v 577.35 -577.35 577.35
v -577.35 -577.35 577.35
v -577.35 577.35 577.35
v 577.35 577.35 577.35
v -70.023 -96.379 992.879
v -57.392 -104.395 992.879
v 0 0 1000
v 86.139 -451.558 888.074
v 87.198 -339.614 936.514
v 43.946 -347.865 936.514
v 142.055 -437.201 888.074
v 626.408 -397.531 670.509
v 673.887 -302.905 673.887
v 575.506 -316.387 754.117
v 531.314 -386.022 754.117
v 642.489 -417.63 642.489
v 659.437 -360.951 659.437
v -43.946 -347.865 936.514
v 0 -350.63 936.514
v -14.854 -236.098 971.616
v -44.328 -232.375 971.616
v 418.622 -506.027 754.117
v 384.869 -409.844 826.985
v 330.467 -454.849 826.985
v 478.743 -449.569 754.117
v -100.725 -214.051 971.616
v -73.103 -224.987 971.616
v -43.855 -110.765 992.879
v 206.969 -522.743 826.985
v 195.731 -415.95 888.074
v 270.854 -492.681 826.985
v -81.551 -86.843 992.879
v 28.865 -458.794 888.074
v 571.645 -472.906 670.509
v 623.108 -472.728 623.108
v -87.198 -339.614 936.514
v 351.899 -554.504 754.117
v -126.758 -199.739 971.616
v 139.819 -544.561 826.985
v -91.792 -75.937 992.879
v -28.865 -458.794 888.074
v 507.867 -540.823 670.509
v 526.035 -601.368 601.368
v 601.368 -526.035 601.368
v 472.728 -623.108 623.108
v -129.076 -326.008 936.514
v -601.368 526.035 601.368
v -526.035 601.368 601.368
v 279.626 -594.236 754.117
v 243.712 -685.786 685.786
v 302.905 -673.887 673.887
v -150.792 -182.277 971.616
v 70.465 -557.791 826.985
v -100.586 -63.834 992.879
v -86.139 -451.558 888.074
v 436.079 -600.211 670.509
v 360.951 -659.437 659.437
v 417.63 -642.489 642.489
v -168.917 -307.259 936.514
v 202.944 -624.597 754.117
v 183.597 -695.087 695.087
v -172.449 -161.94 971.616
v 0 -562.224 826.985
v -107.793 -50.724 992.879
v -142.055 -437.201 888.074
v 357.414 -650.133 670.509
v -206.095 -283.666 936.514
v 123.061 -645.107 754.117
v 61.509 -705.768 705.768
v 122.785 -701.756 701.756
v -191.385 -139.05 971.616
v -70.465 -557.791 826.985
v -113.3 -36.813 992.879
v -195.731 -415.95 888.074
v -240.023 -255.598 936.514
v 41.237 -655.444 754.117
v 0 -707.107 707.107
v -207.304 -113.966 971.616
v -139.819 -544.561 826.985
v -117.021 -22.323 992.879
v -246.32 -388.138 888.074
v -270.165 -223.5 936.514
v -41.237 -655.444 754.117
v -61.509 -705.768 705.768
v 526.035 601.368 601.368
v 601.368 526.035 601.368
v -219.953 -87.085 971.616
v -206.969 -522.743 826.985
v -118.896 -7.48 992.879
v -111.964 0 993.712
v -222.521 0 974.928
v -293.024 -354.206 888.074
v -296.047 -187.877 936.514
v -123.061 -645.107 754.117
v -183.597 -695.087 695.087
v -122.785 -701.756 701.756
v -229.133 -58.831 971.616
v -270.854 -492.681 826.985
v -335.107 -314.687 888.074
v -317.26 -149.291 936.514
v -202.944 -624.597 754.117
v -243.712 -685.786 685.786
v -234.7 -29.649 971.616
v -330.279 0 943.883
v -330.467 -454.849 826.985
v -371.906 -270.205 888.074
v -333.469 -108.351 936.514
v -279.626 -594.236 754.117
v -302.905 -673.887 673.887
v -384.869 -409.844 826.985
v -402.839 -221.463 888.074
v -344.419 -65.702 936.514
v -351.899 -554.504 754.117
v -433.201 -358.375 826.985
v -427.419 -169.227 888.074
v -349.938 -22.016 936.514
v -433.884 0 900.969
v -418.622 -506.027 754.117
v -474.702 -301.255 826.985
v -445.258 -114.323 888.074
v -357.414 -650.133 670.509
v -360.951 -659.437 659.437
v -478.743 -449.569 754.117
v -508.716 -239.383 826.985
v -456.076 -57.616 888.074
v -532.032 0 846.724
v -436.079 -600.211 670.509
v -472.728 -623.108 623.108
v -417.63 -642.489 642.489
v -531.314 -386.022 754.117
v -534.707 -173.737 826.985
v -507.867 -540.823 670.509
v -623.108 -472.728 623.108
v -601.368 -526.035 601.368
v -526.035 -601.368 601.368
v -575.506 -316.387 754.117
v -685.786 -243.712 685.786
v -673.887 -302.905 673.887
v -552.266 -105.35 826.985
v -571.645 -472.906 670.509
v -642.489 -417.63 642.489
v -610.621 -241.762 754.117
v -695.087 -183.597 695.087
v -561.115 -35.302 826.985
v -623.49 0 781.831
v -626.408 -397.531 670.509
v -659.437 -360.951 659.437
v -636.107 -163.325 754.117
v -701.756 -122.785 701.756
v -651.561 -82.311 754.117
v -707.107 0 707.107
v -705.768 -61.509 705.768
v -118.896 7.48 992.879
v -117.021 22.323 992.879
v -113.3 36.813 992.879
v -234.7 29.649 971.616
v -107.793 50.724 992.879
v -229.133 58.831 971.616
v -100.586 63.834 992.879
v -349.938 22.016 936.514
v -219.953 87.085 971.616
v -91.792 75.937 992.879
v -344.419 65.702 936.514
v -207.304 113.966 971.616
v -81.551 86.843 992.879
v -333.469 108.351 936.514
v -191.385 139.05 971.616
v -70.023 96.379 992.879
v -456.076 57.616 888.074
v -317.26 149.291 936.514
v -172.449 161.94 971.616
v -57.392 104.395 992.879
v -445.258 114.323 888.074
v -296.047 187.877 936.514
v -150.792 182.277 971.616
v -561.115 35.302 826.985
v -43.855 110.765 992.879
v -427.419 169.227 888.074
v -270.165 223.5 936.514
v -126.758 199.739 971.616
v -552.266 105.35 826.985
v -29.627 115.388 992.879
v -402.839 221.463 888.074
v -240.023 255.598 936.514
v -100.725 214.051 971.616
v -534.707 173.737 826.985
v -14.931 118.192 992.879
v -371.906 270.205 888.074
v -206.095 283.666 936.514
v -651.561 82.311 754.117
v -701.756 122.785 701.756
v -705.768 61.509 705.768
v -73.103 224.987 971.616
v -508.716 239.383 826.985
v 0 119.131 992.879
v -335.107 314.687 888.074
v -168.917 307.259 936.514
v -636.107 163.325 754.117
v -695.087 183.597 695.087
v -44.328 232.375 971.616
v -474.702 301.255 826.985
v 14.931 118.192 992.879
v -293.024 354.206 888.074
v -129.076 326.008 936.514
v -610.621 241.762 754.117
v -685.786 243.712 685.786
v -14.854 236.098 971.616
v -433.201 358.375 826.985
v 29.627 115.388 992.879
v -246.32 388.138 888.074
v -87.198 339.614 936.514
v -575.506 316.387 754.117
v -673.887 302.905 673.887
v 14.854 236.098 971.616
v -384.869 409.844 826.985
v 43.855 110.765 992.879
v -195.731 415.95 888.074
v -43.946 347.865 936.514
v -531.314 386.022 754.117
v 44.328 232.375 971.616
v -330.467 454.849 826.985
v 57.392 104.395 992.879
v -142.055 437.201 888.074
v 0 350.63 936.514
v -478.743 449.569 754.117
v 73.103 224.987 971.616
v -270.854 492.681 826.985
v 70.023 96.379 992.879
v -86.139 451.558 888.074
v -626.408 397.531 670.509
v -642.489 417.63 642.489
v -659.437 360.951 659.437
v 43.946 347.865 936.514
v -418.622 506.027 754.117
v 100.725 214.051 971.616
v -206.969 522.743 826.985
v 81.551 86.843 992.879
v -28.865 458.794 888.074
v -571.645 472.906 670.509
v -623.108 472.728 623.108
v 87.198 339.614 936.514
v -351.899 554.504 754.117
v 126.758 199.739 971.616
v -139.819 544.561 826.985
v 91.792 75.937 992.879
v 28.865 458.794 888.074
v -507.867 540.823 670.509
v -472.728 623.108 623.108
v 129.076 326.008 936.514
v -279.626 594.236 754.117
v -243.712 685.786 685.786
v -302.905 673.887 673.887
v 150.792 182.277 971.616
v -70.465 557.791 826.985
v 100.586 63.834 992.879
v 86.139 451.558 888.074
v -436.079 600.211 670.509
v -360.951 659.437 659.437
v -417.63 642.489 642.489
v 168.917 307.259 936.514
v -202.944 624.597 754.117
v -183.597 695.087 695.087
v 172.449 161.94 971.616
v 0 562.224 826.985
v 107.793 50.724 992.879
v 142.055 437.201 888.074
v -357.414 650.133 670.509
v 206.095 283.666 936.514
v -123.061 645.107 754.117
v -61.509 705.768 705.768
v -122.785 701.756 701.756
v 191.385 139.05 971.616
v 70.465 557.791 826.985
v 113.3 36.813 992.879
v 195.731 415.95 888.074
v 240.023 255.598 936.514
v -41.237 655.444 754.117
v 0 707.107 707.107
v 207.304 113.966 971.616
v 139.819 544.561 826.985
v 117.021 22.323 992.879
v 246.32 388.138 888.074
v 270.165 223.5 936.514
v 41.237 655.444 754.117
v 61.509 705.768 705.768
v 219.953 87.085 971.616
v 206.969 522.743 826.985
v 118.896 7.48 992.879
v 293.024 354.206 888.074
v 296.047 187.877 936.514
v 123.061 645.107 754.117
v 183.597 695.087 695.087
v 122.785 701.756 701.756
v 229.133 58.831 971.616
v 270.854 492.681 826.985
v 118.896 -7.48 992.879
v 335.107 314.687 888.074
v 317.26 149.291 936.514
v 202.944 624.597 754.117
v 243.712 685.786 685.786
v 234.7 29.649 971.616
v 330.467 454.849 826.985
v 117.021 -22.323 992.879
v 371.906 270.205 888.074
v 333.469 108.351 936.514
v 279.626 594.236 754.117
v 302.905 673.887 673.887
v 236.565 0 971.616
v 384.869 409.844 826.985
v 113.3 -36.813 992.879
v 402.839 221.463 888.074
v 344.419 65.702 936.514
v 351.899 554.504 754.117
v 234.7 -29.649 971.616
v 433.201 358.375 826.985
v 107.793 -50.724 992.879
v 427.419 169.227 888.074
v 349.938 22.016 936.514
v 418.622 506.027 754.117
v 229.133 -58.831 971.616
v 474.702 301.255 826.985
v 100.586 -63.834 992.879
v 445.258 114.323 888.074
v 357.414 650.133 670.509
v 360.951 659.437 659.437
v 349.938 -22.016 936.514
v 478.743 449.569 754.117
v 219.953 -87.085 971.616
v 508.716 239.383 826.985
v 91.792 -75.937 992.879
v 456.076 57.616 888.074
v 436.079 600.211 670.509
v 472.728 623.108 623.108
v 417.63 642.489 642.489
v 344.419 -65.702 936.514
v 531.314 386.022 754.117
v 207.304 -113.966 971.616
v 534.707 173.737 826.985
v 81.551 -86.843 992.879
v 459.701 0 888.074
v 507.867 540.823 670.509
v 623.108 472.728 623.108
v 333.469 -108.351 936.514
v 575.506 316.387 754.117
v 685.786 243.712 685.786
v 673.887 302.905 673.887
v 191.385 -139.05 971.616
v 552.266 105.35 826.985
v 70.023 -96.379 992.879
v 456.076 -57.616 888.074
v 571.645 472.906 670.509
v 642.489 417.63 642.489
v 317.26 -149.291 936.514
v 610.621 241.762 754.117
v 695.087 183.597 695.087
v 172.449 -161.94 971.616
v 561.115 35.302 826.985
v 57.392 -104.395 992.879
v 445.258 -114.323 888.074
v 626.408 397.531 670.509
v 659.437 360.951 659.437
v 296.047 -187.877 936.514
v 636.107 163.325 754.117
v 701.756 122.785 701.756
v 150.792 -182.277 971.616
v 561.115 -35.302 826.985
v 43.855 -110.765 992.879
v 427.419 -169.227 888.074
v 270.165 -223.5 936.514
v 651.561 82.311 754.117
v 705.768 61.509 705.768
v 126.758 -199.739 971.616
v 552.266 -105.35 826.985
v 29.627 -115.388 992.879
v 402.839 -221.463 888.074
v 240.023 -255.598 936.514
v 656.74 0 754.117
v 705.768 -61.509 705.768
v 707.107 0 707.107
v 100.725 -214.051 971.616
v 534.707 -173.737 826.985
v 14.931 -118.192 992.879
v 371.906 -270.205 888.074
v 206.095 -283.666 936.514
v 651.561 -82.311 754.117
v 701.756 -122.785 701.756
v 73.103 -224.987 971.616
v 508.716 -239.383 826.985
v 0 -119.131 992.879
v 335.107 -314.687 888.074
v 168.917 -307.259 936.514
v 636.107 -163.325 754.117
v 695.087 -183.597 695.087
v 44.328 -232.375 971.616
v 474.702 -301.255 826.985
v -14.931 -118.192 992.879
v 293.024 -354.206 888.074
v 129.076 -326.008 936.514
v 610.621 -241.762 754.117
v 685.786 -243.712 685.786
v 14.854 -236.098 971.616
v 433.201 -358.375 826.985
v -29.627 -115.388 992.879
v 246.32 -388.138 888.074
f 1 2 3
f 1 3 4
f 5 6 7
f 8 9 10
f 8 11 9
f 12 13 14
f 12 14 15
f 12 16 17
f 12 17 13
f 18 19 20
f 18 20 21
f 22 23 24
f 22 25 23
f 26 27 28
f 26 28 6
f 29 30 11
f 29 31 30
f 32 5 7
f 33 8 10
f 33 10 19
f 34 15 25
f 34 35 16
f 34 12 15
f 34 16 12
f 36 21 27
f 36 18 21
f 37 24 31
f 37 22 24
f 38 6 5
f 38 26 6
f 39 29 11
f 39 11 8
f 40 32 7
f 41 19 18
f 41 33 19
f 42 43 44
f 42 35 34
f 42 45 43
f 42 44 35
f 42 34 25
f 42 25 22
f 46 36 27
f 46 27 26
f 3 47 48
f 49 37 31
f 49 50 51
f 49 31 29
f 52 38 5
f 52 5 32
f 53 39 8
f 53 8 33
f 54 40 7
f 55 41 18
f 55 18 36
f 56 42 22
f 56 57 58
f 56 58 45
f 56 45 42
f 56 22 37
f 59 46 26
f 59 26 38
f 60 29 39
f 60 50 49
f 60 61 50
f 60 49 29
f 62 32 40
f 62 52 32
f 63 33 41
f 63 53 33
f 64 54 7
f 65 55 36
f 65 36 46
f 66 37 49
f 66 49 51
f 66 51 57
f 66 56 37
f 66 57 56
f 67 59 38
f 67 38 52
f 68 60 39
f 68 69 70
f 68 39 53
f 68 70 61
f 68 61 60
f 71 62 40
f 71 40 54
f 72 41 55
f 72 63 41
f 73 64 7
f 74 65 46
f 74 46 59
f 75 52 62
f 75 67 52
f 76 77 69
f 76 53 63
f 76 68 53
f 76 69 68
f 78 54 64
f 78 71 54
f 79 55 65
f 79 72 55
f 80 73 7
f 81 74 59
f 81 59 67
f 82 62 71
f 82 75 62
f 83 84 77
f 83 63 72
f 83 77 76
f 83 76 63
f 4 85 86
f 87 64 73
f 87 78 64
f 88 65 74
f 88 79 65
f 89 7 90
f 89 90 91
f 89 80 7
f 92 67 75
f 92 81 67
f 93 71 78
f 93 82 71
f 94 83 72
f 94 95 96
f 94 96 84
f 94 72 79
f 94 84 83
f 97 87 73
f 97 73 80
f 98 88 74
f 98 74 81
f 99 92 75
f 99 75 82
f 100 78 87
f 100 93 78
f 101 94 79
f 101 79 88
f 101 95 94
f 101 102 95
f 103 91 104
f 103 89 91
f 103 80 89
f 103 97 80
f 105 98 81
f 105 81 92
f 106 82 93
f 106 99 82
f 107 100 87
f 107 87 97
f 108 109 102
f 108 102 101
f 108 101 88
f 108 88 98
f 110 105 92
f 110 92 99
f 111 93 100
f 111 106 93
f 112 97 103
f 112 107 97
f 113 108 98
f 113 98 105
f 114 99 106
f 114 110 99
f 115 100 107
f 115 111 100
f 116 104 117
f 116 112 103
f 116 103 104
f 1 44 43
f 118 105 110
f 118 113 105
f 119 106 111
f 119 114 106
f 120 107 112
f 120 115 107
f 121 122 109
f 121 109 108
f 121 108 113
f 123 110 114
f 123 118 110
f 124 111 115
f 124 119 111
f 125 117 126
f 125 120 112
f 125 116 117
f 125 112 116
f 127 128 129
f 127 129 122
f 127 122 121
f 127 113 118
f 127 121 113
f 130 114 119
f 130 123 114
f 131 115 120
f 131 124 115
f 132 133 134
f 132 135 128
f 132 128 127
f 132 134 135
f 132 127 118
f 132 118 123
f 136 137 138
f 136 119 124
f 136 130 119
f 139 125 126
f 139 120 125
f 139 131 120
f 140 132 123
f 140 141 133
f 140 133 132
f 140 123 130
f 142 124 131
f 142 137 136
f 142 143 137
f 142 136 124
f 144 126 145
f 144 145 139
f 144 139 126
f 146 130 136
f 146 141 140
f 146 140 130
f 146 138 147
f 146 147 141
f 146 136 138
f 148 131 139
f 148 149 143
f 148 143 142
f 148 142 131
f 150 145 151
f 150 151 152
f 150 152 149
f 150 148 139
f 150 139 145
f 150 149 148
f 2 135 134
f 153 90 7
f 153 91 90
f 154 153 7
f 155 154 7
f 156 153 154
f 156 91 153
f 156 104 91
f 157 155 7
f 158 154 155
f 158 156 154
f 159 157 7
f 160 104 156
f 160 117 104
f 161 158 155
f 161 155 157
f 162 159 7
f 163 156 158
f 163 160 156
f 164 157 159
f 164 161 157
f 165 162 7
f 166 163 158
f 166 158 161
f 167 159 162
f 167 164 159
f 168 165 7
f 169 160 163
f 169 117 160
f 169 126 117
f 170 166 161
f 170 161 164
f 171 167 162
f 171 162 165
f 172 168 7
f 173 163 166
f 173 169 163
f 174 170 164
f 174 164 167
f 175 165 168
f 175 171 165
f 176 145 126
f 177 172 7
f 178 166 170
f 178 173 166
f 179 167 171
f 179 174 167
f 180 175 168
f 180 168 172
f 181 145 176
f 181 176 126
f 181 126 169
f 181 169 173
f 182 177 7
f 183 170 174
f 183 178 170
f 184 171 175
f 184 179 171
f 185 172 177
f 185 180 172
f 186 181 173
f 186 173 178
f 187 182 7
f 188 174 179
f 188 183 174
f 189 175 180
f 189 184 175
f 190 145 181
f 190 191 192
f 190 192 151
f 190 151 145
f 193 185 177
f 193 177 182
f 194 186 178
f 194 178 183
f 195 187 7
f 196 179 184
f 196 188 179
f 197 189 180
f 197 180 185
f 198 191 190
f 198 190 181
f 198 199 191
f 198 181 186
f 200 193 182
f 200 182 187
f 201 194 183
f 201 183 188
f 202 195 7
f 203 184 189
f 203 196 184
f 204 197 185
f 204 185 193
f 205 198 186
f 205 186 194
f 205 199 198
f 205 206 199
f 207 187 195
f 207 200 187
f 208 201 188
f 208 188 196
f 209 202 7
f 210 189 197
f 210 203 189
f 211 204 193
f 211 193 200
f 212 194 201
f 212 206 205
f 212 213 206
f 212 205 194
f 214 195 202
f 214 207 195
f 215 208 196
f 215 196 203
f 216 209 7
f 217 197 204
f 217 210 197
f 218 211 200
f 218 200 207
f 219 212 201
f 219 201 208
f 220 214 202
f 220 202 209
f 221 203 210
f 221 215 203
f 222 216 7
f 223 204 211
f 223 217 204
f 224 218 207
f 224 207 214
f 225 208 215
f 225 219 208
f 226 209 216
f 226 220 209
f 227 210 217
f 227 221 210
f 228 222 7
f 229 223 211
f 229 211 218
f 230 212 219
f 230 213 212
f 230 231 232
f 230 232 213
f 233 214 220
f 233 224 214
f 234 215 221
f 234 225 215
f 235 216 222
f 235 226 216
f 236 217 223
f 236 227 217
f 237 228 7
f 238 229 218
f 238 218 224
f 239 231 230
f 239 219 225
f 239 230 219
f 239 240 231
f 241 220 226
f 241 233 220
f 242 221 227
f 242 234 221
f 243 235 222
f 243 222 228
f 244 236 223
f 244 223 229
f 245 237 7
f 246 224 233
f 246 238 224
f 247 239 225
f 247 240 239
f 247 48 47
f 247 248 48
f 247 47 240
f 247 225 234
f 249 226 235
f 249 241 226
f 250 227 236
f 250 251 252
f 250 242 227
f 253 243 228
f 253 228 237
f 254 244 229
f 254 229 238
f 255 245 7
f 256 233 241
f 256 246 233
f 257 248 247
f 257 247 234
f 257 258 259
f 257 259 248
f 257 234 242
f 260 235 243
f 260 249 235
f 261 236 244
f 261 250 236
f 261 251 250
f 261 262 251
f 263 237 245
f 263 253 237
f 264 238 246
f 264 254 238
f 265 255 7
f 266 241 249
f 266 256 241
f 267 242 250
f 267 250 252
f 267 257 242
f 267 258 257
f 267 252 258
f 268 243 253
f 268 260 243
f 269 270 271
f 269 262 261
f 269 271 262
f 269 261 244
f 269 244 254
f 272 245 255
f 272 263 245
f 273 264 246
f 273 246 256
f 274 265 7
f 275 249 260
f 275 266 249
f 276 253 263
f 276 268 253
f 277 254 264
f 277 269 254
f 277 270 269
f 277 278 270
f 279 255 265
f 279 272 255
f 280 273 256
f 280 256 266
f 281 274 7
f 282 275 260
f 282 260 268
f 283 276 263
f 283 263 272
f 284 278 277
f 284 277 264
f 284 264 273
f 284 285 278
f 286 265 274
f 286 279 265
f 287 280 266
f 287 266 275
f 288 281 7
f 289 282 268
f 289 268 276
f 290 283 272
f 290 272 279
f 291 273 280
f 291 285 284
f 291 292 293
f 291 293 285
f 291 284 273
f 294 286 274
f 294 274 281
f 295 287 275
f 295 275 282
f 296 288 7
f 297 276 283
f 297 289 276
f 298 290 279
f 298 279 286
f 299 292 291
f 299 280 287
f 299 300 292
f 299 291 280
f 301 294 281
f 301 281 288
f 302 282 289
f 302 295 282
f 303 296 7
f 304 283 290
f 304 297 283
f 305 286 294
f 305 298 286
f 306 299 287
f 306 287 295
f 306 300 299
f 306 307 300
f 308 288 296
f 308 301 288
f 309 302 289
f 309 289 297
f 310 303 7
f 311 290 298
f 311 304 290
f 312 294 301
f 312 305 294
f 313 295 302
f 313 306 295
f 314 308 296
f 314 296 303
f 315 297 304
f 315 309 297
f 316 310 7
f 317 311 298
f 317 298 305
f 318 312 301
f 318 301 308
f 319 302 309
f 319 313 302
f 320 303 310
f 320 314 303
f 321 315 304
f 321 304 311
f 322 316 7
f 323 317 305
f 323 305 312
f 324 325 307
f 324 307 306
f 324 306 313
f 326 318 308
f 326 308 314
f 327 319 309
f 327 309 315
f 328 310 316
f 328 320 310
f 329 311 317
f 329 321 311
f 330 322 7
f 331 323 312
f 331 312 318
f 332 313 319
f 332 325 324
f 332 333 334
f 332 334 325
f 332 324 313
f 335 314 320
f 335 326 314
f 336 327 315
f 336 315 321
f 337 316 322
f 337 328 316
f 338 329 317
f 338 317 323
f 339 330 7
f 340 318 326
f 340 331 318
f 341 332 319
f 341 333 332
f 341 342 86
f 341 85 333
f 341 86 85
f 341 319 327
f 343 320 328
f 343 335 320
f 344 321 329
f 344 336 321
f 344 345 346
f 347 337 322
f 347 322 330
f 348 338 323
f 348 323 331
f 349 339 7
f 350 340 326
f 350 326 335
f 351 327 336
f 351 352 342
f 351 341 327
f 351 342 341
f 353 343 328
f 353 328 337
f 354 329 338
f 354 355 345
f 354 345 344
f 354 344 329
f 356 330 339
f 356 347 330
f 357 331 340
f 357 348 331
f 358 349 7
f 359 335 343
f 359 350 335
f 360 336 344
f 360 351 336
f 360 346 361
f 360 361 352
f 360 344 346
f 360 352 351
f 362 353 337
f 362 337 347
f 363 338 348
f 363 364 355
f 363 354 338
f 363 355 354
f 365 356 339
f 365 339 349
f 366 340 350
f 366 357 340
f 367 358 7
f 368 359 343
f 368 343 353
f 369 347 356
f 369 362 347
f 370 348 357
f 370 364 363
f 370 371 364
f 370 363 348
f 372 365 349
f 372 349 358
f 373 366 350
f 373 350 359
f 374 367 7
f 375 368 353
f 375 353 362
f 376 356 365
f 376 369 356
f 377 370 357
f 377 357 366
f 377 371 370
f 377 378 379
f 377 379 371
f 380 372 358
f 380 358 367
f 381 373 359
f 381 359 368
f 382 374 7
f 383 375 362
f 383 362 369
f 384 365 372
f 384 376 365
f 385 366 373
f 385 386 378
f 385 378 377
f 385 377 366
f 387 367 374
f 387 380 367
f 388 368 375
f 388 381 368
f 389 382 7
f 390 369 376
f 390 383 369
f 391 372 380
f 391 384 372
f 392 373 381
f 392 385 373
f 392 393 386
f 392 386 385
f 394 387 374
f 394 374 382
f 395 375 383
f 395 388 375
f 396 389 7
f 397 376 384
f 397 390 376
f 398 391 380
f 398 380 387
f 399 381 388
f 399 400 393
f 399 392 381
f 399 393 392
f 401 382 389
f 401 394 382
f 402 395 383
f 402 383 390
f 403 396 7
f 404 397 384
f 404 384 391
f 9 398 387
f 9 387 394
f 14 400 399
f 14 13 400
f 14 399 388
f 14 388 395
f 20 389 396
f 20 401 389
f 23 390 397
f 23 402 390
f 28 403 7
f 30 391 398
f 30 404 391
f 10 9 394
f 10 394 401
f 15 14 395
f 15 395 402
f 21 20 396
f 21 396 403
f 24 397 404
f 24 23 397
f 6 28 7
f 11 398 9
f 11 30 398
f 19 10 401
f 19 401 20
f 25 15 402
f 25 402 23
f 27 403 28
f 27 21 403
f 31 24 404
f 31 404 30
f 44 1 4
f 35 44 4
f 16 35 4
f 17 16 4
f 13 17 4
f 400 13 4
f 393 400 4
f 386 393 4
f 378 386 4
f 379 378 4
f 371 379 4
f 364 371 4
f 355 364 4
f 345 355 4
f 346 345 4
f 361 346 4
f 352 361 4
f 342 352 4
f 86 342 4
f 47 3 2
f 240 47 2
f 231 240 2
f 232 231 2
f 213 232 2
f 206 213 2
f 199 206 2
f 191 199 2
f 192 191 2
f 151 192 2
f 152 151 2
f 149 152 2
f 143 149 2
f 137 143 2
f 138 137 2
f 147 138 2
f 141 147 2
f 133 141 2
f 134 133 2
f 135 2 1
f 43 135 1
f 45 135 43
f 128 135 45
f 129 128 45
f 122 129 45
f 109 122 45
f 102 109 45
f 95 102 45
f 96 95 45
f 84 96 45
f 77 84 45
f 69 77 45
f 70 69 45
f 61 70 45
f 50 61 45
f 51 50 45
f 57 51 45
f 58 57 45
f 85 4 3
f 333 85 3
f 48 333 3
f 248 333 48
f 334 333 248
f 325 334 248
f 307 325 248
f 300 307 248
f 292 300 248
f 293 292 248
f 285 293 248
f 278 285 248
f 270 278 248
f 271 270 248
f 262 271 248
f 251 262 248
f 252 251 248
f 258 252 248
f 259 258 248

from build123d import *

# Parameters (mm, degrees)
F3_DEPTH = 1100
F5_DEPTH = 1100
F6_R     = 1000
F7_DEPTH = 577.3502691896


with BuildPart() as f1:
    # F0 (on Front) → F1 (revolve)
    with BuildSketch(Plane.XZ):
        with BuildLine():
            Line((0, -1000), (0, 1000))
            ThreePointArc((0, 1000), (-1000, 0), (0, -1000))
        make_face()
    revolve(axis=Axis((0, 0, 0), (0, 0, -1)))

    # F2 (on Front) → F3 (cut, symmetric)
    with BuildSketch(Plane.XZ):
        Polygon((0, 0), (-1100, 1100), (-1100, -1100), (1100, -1100), (1100, 1100), align=None)
    extrude(amount=F3_DEPTH, both=True, mode=Mode.SUBTRACT)

    # F4 (on Right) → F5 (cut, symmetric)
    with BuildSketch(Plane.YZ):
        Polygon((0, 0), (-1100, 1100), (-1100, -1100), (1100, -1100), (1100, 1100), align=None)
    extrude(amount=F5_DEPTH, both=True, mode=Mode.SUBTRACT)

    # F6 (on Top) → F7 (cut, through all)
    with BuildSketch(Plane.XY):
        Circle(F6_R)
    extrude(amount=F7_DEPTH, mode=Mode.SUBTRACT)


solid = f1.part
